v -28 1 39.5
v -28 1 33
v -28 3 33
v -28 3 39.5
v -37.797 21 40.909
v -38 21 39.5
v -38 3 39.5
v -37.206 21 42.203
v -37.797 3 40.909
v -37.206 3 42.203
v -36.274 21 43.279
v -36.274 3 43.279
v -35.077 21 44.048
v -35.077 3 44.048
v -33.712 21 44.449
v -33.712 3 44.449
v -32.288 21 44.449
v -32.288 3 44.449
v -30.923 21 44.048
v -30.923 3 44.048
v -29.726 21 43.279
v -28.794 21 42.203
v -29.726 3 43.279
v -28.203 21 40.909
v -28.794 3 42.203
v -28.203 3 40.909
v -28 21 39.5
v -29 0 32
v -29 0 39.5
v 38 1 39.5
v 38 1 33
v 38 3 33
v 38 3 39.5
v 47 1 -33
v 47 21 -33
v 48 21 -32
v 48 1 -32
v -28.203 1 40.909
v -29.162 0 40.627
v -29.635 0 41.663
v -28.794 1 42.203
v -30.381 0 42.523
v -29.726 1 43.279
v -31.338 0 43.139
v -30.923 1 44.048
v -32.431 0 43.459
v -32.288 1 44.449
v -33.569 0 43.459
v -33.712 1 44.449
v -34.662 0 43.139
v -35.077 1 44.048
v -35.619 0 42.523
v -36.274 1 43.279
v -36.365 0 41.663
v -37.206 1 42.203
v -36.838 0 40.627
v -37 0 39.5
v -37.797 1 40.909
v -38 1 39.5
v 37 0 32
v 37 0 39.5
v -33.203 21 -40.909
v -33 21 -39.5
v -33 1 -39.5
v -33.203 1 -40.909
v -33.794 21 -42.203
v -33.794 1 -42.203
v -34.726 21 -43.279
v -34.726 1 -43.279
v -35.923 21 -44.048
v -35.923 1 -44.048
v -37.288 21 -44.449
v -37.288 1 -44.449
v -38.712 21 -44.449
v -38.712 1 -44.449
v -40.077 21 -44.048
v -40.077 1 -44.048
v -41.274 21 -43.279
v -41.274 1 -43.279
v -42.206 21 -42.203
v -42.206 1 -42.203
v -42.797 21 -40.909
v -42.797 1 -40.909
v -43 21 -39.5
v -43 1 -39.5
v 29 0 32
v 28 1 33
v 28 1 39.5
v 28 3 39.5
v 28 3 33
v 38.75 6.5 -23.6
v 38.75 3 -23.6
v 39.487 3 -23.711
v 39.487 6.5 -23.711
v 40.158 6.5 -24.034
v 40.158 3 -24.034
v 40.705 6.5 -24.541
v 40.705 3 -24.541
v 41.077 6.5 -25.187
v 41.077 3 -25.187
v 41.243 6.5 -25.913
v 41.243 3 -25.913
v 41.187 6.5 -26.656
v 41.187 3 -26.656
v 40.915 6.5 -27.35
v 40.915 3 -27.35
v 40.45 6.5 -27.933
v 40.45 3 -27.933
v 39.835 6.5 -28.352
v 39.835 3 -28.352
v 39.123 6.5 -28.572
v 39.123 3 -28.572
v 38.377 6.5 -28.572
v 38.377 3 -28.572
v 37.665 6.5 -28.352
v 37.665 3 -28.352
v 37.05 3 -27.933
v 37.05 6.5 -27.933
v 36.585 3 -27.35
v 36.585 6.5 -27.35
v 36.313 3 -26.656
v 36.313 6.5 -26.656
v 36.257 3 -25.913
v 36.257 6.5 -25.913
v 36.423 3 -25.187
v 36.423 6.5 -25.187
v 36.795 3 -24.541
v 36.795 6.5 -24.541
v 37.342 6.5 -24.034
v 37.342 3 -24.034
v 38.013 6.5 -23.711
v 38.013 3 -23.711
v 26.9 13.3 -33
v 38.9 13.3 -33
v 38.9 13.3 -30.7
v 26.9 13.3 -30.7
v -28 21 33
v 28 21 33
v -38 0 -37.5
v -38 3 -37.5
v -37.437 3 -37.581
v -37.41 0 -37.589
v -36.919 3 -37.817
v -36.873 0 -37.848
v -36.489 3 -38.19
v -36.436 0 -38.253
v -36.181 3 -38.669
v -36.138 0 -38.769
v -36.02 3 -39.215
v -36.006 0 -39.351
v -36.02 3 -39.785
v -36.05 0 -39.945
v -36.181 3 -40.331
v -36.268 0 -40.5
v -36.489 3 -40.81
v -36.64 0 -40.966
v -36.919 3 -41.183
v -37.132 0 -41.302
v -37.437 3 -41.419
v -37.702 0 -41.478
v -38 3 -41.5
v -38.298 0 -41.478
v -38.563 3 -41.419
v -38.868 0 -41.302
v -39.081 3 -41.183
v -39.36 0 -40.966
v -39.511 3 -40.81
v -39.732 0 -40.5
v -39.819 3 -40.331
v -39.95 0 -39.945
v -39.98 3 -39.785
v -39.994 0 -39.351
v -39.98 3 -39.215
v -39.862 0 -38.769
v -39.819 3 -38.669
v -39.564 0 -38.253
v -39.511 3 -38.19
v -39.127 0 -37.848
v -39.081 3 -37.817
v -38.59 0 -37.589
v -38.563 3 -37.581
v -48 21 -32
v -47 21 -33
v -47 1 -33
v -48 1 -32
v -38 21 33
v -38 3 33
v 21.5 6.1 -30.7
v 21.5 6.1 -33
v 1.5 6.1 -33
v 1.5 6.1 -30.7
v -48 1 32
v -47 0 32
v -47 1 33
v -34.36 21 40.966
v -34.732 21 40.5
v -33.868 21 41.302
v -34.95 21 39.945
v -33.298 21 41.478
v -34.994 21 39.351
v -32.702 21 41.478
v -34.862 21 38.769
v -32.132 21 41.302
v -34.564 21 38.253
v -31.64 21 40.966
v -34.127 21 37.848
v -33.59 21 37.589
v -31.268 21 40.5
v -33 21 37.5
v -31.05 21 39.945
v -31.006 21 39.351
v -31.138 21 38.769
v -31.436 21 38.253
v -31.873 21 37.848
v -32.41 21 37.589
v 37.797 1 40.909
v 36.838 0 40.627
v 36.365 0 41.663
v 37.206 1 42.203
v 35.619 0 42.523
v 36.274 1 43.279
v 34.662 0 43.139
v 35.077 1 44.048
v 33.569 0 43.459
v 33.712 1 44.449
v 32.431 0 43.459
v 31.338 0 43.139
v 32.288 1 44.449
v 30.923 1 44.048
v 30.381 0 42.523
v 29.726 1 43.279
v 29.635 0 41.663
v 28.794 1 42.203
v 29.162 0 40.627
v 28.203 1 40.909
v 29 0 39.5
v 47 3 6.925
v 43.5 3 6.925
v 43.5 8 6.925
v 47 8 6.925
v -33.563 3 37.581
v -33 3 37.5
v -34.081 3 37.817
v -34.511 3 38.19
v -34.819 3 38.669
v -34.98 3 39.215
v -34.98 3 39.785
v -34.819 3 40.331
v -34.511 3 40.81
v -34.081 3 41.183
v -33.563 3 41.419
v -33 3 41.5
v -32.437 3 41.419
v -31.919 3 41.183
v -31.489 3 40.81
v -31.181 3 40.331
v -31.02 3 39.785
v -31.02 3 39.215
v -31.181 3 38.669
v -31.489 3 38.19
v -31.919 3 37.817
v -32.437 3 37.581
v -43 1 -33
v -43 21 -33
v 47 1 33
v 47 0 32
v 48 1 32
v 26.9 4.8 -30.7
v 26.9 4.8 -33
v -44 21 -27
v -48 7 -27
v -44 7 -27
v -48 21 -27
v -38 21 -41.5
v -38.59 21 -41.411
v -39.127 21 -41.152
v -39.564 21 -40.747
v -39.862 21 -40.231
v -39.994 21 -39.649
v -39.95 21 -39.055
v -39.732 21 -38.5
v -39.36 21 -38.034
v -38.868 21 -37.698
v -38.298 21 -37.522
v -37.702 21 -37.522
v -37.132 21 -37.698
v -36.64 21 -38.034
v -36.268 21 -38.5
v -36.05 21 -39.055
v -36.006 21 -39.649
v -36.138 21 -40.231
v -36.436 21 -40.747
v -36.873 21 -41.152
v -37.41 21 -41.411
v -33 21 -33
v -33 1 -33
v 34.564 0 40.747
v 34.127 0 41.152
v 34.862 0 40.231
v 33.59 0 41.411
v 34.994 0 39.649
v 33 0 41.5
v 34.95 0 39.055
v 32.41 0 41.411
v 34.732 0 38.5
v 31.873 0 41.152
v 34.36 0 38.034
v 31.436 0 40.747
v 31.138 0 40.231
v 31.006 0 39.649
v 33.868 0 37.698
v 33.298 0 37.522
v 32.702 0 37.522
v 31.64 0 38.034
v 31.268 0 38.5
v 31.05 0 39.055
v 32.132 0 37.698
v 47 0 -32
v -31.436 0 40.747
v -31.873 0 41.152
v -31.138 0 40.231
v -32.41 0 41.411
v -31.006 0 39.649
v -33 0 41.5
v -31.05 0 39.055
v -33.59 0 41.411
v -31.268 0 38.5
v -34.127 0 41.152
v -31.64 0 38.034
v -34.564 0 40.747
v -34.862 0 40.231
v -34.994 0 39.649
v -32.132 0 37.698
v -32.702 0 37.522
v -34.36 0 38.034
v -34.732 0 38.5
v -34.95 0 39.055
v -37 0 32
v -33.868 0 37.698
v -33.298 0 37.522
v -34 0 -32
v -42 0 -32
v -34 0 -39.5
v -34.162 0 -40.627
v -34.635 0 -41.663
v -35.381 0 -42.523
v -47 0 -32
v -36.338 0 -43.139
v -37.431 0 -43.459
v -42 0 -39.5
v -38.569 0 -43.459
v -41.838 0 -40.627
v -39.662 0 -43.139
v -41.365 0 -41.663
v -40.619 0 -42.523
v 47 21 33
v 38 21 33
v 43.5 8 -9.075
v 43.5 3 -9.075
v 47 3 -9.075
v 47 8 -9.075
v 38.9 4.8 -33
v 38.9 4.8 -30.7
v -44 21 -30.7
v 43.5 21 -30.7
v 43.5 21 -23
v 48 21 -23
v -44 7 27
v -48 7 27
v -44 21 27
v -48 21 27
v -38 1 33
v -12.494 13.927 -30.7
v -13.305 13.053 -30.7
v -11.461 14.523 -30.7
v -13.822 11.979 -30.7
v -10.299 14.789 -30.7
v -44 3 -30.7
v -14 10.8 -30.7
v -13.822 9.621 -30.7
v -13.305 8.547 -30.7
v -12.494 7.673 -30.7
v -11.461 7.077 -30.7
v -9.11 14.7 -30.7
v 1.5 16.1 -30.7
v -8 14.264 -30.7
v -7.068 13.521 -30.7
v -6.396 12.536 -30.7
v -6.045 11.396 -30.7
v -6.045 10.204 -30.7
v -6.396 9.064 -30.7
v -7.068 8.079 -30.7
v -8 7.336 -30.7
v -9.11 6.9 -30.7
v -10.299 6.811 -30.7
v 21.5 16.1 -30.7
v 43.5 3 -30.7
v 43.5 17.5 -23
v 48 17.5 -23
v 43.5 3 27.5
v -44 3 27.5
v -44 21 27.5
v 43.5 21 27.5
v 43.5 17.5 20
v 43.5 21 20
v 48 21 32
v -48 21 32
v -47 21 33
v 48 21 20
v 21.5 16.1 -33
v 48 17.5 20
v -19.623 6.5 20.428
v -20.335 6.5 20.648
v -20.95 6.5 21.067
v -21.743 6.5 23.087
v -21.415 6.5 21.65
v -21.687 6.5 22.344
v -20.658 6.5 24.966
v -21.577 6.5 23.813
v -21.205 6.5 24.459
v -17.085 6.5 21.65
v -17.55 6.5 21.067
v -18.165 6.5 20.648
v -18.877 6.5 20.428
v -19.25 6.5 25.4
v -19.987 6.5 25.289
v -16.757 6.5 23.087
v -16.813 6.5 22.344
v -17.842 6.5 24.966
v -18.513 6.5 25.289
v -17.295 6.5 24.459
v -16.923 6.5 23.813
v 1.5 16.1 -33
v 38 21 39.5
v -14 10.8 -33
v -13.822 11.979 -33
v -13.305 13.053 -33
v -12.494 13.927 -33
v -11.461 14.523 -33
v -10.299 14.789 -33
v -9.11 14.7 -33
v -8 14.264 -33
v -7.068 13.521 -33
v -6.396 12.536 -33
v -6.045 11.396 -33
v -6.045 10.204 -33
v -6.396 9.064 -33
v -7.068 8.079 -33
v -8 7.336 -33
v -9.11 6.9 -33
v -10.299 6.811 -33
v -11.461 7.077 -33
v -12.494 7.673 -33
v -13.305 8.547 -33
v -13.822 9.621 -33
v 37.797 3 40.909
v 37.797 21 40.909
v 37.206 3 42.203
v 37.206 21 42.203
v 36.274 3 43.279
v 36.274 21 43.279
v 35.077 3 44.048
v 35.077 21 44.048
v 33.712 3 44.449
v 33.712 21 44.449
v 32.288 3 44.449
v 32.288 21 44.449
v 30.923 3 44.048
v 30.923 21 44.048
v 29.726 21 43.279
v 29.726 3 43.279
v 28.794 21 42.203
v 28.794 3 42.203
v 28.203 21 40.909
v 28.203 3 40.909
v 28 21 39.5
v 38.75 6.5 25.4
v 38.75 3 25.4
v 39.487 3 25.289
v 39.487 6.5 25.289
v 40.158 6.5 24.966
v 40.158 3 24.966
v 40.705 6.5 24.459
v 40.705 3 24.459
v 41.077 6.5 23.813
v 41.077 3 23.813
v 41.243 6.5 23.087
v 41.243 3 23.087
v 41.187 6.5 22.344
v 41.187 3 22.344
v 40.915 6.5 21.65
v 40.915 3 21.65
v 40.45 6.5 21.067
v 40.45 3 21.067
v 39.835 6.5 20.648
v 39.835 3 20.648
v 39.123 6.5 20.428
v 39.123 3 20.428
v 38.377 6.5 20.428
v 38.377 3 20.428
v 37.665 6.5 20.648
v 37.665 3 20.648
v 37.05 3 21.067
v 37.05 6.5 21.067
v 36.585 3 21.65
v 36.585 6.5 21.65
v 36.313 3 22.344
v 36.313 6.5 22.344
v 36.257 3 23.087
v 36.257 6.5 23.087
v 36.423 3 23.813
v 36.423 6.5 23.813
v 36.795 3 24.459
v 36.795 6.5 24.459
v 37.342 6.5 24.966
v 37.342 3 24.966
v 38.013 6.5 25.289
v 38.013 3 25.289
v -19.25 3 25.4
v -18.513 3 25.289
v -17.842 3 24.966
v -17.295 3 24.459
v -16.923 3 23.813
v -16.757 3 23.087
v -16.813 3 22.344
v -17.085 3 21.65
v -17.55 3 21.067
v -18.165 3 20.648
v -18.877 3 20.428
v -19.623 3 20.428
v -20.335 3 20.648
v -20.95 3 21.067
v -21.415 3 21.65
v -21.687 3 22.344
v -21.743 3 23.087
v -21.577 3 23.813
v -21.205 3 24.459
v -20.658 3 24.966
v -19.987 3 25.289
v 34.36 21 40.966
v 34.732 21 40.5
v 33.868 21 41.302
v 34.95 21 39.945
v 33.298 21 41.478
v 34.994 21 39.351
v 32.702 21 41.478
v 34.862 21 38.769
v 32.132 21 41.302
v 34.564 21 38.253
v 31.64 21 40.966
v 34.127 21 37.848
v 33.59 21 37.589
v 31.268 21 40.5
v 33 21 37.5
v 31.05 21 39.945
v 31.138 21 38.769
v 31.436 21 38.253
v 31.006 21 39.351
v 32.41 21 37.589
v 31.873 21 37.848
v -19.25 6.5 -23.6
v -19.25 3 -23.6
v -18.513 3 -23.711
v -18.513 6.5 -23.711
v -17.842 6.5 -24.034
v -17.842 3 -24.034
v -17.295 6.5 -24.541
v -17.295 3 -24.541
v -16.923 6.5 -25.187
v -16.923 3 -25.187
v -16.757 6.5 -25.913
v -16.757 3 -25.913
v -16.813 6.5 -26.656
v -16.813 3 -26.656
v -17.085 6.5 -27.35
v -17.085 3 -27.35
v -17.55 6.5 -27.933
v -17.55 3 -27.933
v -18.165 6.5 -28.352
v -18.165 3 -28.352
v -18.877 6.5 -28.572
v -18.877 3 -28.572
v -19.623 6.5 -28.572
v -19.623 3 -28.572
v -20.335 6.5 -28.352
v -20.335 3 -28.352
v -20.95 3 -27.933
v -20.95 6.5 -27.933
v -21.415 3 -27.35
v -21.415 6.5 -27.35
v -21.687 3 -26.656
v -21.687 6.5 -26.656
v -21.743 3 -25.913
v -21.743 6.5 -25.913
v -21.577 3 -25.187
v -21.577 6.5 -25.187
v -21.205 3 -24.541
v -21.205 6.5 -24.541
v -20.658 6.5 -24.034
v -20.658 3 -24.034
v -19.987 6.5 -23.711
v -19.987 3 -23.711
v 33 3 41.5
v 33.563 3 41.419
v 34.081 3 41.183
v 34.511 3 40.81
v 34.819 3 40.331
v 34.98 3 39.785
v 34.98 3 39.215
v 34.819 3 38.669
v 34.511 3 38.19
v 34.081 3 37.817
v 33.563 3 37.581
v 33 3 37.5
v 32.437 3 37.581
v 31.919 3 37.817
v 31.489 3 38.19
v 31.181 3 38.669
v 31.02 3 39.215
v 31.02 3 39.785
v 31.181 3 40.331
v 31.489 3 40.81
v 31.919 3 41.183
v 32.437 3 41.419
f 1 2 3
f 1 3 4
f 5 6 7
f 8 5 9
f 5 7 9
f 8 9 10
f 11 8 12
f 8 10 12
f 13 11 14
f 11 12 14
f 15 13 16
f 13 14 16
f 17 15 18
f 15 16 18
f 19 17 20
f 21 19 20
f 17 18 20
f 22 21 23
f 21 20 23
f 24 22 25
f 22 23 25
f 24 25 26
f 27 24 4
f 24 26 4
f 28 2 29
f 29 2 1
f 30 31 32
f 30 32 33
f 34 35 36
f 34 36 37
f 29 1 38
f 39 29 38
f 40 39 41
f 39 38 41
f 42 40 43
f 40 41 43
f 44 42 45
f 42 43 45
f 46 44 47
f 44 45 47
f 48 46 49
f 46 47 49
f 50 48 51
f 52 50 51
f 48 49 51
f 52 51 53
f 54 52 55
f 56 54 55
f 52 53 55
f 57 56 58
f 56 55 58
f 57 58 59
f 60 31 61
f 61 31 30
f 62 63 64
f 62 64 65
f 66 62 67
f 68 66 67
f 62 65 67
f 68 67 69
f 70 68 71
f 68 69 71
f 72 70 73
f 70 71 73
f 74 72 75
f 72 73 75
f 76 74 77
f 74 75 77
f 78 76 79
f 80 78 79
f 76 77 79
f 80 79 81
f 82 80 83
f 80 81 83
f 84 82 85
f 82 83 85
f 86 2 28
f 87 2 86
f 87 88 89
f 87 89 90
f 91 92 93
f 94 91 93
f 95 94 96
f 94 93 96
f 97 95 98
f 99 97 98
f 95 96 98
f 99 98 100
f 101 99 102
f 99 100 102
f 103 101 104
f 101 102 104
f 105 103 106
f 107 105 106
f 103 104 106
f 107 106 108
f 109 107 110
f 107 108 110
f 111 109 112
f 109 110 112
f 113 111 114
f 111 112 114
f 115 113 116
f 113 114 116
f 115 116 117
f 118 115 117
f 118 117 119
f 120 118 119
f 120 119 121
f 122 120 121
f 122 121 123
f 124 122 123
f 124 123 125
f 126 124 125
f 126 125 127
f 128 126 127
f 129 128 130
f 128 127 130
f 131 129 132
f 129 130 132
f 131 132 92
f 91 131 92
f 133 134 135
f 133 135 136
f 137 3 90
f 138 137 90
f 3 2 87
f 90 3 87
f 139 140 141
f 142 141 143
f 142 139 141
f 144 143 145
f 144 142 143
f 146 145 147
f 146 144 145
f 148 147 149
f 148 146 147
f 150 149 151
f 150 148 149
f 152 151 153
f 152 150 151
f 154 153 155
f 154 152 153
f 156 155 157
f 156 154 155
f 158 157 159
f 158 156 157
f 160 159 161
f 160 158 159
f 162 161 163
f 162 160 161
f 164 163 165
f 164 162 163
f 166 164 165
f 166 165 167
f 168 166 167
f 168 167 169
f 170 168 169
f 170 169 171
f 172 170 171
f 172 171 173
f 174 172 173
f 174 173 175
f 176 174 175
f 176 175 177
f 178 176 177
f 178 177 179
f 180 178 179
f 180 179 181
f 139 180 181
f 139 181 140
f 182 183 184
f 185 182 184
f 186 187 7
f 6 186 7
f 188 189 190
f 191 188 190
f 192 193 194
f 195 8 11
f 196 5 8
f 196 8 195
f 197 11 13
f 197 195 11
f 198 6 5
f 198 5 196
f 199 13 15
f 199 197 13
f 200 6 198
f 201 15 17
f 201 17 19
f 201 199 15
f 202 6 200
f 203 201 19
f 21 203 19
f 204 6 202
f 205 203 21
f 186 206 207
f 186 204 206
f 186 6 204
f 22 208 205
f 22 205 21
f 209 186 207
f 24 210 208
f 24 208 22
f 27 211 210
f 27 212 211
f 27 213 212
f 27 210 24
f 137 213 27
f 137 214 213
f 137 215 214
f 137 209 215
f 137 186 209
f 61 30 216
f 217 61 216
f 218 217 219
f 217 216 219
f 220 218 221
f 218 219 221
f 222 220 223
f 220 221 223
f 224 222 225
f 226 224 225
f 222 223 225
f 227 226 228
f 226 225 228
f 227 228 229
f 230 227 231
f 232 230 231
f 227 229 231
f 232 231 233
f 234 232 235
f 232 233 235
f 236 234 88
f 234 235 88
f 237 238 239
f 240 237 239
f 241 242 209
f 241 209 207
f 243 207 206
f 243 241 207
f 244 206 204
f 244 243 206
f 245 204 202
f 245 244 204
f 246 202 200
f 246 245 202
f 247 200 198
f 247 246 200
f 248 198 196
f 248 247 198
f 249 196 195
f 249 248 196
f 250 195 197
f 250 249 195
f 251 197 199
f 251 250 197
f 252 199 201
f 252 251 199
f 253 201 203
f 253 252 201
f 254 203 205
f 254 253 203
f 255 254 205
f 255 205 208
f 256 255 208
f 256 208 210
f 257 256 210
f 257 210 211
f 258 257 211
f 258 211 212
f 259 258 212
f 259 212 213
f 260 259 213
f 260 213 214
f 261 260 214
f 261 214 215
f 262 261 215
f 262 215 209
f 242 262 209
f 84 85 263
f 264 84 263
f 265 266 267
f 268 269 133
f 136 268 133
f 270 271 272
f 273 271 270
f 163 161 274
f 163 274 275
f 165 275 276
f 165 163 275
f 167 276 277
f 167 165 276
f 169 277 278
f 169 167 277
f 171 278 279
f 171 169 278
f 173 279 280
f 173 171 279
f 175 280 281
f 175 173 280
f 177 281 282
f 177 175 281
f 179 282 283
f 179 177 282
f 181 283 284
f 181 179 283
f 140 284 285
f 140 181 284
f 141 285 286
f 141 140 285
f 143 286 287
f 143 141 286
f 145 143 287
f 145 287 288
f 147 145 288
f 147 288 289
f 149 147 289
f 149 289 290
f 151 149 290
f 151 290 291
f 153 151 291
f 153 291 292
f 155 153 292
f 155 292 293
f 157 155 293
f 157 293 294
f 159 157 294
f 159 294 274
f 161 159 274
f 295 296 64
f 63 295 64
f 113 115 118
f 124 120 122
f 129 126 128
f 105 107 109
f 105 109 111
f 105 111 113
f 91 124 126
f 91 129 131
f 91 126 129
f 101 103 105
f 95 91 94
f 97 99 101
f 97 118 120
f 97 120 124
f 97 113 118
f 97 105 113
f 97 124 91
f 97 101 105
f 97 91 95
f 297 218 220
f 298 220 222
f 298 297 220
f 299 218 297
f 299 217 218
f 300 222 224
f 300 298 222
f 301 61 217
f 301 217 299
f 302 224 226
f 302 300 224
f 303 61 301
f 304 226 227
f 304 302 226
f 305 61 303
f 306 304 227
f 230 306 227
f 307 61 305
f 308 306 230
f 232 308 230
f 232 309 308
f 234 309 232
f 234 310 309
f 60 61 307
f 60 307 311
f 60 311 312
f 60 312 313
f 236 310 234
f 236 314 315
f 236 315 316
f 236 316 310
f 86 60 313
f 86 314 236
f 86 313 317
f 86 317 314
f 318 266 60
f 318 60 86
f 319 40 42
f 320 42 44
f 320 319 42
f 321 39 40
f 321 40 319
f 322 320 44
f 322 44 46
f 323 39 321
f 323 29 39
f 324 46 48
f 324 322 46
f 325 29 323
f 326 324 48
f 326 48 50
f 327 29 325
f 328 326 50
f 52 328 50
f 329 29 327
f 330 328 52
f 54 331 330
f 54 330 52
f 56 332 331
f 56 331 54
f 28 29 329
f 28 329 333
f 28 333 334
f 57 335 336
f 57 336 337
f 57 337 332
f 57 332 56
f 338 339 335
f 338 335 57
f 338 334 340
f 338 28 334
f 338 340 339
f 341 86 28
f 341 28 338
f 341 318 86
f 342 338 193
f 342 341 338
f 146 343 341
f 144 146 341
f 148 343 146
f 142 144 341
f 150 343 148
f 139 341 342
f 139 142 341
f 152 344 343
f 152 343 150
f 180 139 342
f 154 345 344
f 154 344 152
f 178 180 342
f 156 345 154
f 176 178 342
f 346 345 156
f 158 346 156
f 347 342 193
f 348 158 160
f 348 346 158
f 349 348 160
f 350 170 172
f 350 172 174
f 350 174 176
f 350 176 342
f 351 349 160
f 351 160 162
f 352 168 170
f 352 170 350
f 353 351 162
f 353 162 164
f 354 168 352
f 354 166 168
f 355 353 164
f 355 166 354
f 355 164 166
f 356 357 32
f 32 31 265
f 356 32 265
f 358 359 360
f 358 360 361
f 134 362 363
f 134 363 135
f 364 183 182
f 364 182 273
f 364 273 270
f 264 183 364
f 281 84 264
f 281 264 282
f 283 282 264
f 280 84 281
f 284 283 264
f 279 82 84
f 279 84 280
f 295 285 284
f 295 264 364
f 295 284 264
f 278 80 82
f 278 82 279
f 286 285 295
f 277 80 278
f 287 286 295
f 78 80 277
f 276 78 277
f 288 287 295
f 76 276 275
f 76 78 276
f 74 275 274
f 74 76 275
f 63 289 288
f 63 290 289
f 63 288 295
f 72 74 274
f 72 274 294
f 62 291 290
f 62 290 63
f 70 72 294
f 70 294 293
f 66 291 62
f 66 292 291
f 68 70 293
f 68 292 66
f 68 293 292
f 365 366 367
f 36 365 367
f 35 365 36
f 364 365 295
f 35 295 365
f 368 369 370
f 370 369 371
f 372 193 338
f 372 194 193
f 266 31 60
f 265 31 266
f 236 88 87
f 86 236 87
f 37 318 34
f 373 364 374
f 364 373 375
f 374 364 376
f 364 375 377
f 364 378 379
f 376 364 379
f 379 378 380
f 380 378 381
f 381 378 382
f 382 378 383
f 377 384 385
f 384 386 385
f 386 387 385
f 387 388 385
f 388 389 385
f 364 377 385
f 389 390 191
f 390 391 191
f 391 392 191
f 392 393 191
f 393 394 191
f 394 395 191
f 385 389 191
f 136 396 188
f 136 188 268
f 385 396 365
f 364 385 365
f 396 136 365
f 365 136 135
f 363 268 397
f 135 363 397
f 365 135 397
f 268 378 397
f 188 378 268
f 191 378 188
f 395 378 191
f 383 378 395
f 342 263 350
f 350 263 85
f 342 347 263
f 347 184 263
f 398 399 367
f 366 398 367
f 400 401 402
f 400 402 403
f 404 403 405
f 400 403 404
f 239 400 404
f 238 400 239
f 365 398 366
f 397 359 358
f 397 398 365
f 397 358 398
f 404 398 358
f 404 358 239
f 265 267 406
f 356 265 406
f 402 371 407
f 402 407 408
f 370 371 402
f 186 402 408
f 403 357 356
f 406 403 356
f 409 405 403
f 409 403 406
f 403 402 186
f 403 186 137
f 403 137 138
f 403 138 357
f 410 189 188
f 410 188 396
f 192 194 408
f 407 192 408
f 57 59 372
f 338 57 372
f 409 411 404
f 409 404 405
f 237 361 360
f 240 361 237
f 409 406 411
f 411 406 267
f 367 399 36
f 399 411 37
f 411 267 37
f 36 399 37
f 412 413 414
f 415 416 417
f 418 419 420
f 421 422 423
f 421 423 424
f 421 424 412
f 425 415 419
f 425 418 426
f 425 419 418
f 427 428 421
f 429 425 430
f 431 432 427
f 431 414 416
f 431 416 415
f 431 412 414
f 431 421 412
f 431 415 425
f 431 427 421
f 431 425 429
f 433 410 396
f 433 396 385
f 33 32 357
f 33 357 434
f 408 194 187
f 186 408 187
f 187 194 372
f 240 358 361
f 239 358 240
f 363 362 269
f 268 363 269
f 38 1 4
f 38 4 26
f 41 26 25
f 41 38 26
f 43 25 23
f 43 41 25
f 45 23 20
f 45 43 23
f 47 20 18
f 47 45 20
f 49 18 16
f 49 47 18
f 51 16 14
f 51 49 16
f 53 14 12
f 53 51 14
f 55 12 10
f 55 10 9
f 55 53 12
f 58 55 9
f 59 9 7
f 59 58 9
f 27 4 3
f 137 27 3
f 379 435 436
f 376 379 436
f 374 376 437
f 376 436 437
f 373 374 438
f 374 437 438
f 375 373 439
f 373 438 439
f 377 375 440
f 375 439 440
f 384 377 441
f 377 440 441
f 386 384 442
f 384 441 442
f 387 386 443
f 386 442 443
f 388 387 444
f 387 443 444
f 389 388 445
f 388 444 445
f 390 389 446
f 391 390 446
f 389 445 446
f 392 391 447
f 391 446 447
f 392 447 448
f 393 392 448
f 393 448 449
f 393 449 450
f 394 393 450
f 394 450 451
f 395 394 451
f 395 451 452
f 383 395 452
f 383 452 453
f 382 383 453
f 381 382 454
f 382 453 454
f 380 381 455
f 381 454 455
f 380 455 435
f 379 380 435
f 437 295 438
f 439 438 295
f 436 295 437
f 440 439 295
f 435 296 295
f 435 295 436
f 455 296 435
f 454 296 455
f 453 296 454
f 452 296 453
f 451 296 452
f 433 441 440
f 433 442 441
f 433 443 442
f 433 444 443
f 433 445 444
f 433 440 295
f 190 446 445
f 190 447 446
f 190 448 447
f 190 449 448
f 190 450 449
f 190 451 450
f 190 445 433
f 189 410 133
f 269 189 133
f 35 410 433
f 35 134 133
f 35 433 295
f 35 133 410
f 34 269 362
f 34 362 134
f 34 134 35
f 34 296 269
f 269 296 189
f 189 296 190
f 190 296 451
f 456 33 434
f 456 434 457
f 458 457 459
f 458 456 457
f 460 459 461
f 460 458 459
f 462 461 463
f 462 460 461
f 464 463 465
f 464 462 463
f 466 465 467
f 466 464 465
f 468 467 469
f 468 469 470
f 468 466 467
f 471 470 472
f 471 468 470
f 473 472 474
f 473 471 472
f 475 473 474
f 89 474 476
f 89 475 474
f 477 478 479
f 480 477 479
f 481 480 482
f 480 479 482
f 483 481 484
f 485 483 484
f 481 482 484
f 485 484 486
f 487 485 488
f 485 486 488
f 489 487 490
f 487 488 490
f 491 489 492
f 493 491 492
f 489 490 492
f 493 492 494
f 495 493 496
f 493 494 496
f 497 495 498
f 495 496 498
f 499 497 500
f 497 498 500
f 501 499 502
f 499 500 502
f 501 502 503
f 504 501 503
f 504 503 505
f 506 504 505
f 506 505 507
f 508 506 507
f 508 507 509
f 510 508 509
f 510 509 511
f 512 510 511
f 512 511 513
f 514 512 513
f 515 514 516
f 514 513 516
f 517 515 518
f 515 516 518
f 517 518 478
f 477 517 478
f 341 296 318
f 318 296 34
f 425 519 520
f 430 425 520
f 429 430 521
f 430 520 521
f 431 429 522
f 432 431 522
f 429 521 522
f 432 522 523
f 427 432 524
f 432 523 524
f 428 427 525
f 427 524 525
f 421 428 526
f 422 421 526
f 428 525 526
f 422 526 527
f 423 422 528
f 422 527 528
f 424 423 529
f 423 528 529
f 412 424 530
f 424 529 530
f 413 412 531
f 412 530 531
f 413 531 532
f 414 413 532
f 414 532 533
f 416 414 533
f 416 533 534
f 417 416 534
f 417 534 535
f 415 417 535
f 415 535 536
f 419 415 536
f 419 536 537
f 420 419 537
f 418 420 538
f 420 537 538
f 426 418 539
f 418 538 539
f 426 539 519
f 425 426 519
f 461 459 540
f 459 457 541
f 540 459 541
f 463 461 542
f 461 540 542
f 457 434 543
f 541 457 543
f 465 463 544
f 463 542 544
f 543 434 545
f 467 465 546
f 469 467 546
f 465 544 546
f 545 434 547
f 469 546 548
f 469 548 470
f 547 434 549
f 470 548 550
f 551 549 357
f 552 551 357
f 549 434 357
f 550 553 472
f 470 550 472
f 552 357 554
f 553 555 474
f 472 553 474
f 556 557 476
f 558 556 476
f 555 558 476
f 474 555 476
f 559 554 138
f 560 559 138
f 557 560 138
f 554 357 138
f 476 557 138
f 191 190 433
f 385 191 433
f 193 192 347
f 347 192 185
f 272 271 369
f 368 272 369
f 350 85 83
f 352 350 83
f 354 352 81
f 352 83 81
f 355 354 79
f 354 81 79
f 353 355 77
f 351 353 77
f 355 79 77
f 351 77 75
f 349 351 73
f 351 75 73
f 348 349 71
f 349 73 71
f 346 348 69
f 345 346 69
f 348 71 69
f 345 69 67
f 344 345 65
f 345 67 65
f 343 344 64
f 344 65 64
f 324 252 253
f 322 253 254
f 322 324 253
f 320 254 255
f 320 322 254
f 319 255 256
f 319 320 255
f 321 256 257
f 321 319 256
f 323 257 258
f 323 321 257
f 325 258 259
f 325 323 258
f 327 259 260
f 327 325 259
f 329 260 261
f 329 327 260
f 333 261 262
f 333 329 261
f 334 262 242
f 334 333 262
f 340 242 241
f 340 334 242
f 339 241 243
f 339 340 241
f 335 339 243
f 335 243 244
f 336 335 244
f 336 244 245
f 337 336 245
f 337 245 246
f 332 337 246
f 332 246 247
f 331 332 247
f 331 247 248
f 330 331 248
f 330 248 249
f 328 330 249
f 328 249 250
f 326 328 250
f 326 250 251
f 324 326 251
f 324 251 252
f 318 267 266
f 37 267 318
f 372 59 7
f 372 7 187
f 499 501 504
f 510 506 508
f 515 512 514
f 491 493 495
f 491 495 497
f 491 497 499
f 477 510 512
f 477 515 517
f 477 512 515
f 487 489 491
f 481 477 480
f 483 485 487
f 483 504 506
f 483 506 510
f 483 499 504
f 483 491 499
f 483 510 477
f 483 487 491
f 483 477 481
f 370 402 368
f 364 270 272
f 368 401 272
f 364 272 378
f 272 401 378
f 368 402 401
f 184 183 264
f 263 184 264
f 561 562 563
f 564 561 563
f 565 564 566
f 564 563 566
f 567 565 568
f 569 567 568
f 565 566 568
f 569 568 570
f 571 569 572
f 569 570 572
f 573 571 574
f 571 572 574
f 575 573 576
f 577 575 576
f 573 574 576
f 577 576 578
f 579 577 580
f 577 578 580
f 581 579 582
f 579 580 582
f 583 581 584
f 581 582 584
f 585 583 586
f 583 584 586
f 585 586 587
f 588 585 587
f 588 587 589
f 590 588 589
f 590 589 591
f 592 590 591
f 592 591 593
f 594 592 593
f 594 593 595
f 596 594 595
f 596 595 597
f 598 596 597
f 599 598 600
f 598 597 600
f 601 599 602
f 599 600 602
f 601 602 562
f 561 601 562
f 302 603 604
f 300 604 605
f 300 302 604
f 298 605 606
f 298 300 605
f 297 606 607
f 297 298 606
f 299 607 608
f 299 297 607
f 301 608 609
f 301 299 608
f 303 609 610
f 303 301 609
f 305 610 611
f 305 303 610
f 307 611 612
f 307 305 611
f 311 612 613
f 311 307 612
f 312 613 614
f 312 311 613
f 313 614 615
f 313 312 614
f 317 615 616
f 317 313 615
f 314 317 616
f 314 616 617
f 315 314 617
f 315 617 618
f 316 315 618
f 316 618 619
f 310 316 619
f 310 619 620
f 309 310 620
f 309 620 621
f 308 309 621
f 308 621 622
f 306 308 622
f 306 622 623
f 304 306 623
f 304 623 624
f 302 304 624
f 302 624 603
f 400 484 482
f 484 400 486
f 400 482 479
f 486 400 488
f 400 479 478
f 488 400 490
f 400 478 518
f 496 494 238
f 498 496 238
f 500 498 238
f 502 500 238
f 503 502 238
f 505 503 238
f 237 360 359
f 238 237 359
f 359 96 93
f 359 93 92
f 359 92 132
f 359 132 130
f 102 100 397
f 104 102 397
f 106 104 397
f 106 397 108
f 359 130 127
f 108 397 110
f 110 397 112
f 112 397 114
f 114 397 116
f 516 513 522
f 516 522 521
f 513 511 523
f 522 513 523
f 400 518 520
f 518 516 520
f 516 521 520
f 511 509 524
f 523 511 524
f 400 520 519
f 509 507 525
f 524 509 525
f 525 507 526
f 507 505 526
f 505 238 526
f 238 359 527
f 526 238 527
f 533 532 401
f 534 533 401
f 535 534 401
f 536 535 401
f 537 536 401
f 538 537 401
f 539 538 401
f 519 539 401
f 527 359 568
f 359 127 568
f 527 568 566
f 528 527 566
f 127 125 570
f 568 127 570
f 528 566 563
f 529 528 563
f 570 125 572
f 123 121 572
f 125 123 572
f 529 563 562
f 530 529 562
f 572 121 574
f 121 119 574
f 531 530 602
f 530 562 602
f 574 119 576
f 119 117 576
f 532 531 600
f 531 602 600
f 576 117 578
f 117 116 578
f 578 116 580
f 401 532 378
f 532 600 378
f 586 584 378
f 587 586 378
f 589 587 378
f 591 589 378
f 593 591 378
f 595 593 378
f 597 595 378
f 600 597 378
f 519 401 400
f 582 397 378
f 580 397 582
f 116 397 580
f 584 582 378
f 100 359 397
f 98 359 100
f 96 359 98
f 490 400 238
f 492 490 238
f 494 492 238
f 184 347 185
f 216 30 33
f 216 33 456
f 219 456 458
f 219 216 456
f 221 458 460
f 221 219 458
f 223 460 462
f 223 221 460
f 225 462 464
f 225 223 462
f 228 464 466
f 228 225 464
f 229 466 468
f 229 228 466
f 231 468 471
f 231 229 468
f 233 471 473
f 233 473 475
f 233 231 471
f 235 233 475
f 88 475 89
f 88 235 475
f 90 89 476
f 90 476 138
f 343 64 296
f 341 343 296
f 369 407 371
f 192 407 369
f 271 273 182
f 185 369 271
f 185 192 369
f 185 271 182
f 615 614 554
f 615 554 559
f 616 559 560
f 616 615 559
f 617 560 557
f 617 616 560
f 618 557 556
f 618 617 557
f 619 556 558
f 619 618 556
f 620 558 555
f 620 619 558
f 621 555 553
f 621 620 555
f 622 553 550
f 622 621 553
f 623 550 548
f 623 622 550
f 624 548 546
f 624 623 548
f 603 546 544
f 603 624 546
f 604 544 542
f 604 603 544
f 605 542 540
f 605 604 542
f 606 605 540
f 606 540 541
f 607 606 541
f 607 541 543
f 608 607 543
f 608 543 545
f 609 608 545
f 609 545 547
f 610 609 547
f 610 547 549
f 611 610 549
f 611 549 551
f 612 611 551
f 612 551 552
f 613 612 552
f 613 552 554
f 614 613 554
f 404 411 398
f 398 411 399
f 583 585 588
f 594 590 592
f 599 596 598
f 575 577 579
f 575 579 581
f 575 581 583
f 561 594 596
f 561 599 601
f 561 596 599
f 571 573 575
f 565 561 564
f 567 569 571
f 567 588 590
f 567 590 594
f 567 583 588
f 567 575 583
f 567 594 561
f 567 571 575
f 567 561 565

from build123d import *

# Parameters (mm, degrees)
SKETCH1_W           = 96
SKETCH1_H           = 66
BOSS_EXTRUDE2_DEPTH = 3
SKETCH4_R           = 2
BOSS_EXTRUDE3_DEPTH = 3
SKETCH8_R           = 2.5
BOSS_EXTRUDE5_DEPTH = 3.5
SKETCH9_W           = 96
SKETCH9_H           = 66
SKETCH9_W_2         = 87.5
SKETCH9_H_2         = 58.2
BOSS_EXTRUDE6_DEPTH = 18
SKETCH11_W          = 54
SKETCH11_H          = 14
CUT_EXTRUDE1_DEPTH  = 4
SKETCH12_W          = 43
SKETCH12_H          = 3.5
CUT_EXTRUDE2_DEPTH  = 4.5
SKETCH13_W          = 16
SKETCH13_H          = 5
CUT_EXTRUDE3_DEPTH  = 3.5
SKETCH14_R          = 4
SKETCH14_W          = 12
SKETCH14_H          = 8.5
SKETCH14_W_2        = 20
SKETCH14_H_2        = 10
CUT_EXTRUDE4_DEPTH  = 2.3
SKETCH16_R          = 2
BOSS_EXTRUDE7_DEPTH = 18
CHAMFER2_SIZE       = 1


with BuildPart() as part:
    # Sketch1 → Boss-Extrude2 (new body)
    with BuildSketch(Plane(origin=(0, 0, 0), x_dir=(1, 0, 0), z_dir=(0, 1, 0))):
        Rectangle(SKETCH1_W, SKETCH1_H)
    extrude(amount=BOSS_EXTRUDE2_DEPTH)

    # Sketch4 → Boss-Extrude3 (add)
    # profile 1 of 3: a face of its own
    with BuildSketch(Plane(origin=(0, 0, 0), x_dir=(1, 0, 0), z_dir=(0, 1, 0))):
        with BuildLine():
            Line((-43, 33), (-43, 39.5))
            ThreePointArc((-43, 39.5), (-38, 44.5), (-33, 39.5))
            Line((-33, 39.5), (-33, 33))
            ThreePointArc((-33, 33), (-38, 28), (-43, 33))
        make_face()
        with Locations(Location((-38, 39.5, 0), (0, 0, 270))):
            Circle(SKETCH4_R, mode=Mode.SUBTRACT)
    # profile 2 of 3: a face of its own
    with BuildSketch(Plane(origin=(0, 0, 0), x_dir=(1, 0, 0), z_dir=(0, 1, 0))):
        with BuildLine():
            Line((-28, -33), (-28, -39.5))
            ThreePointArc((-28, -39.5), (-33, -44.5), (-38, -39.5))
            Line((-38, -39.5), (-38, -33))
            ThreePointArc((-38, -33), (-33, -28), (-28, -33))
        make_face()
        with Locations(Location((-33, -39.5, 0), (0, 0, 270))):
            Circle(SKETCH4_R, mode=Mode.SUBTRACT)
    # profile 3 of 3: a face of its own
    with BuildSketch(Plane(origin=(0, 0, 0), x_dir=(1, 0, 0), z_dir=(0, 1, 0))):
        with BuildLine():
            Line((38, -33), (38, -39.5))
            ThreePointArc((38, -39.5), (33, -44.5), (28, -39.5))
            Line((28, -39.5), (28, -33))
            ThreePointArc((28, -33), (33, -28), (38, -33))
        make_face()
        with Locations(Location((33, -39.5, 0), (0, 0, 270))):
            Circle(SKETCH4_R, mode=Mode.SUBTRACT)
    extrude(amount=BOSS_EXTRUDE3_DEPTH)

    # Sketch8 → Boss-Extrude5 (add)
    with BuildSketch(Plane(origin=(0, 3, 0), x_dir=(1, 0, 0), z_dir=(0, 1, 0))):
        with Locations(Location((-19.25, 26.1, 0), (0, 0, 270))):
            Circle(SKETCH8_R)
        with Locations(Location((38.75, 26.1, 0), (0, 0, 270))):
            Circle(SKETCH8_R)
        with Locations(Location((38.75, -22.9, 0), (0, 0, 270))):
            Circle(SKETCH8_R)
        with Locations(Location((-19.25, -22.9, 0), (0, 0, 270))):
            Circle(SKETCH8_R)
    extrude(amount=BOSS_EXTRUDE5_DEPTH)

    # Sketch9 → Boss-Extrude6 (add)
    with BuildSketch(Plane(origin=(0, 3, 0), x_dir=(1, 0, 0), z_dir=(0, 1, 0))):
        Rectangle(SKETCH9_W, SKETCH9_H)
        with Locations((-0.25, 1.6)):
            Rectangle(SKETCH9_W_2, SKETCH9_H_2, mode=Mode.SUBTRACT)
    extrude(amount=BOSS_EXTRUDE6_DEPTH)

    # Sketch11 → Cut-Extrude1 (cut)
    with BuildSketch(Plane.ZY.offset(48)):
        with Locations((0, 14)):
            Rectangle(SKETCH11_W, SKETCH11_H)
    extrude(amount=-CUT_EXTRUDE1_DEPTH, mode=Mode.SUBTRACT)

    # Sketch12 → Cut-Extrude2 (cut)
    with BuildSketch(Plane(origin=(48, 0, 0), x_dir=(0, 0, -1), z_dir=(1, 0, 0))):
        with Locations((1.5, 19.25)):
            Rectangle(SKETCH12_W, SKETCH12_H)
    extrude(amount=-CUT_EXTRUDE2_DEPTH, mode=Mode.SUBTRACT)

    # Sketch13 → Cut-Extrude3 (cut)
    with BuildSketch(Plane.ZY.offset(-43.5)):
        with Locations((-1.07504867, 5.5)):
            Rectangle(SKETCH13_W, SKETCH13_H)
    extrude(amount=-CUT_EXTRUDE3_DEPTH, mode=Mode.SUBTRACT)

    # Sketch14 → Cut-Extrude4 (cut)
    with BuildSketch(Plane(origin=(0, 0, -33), x_dir=(-1, 0, 0), z_dir=(0, 0, -1))):
        with Locations((10, 10.8)):
            Circle(SKETCH14_R)
        with Locations((-32.9, 9.05)):
            Rectangle(SKETCH14_W, SKETCH14_H)
        with Locations((-11.5, 11.1)):
            Rectangle(SKETCH14_W_2, SKETCH14_H_2)
    extrude(amount=-CUT_EXTRUDE4_DEPTH, mode=Mode.SUBTRACT)

    # Sketch16 → Boss-Extrude7 (add)
    # profile 1 of 3: a face of its own
    with BuildSketch(Plane(origin=(0, 3, 0), x_dir=(1, 0, 0), z_dir=(0, 1, 0))):
        with BuildLine():
            Line((-43, 33), (-33, 33))
            Line((-33, 33), (-33, 39.5))
            ThreePointArc((-33, 39.5), (-38, 44.5), (-43, 39.5))
            Line((-43, 39.5), (-43, 33))
        make_face()
        with Locations(Location((-38, 39.5, 0), (0, 0, 90))):
            Circle(SKETCH16_R, mode=Mode.SUBTRACT)
    # profile 2 of 3: a face of its own
    with BuildSketch(Plane(origin=(0, 3, 0), x_dir=(1, 0, 0), z_dir=(0, 1, 0))):
        with BuildLine():
            Line((-38, -33), (-38, -39.5))
            ThreePointArc((-38, -39.5), (-33, -44.5), (-28, -39.5))
            Line((-28, -39.5), (-28, -33))
            Line((-28, -33), (-38, -33))
        make_face()
        with Locations(Location((-33, -39.5, 0), (0, 0, 90))):
            Circle(SKETCH16_R, mode=Mode.SUBTRACT)
    # profile 3 of 3: a face of its own
    with BuildSketch(Plane(origin=(0, 3, 0), x_dir=(1, 0, 0), z_dir=(0, 1, 0))):
        with BuildLine():
            Line((28, -39.5), (28, -33))
            Line((28, -33), (38, -33))
            Line((38, -33), (38, -39.5))
            ThreePointArc((38, -39.5), (33, -44.5), (28, -39.5))
        make_face()
        with Locations(Location((33, -39.5, 0), (0, 0, 90))):
            Circle(SKETCH16_R, mode=Mode.SUBTRACT)
    extrude(amount=BOSS_EXTRUDE7_DEPTH)

    # Chamfer2
    chamfer2_edges = [part.edges().sort_by_distance(p)[0] for p in [
        (-45.5, 0, -33),
        (-33, 0, -36.25),
        (-38, 0, -44.5),
        (-43, 0, -36.25),
        (-43, 0, 33),
        (-38, 0, 36.25),
        (-33, 0, 44.5),
        (-28, 0, 36.25),
        (0, 0, 33),
        (48, 0, 0),
        (28, 0, 36.25),
        (33, 0, 44.5),
        (38, 0, 36.25),
        (43, 0, 33),
        (-48, 0, 0),
        (7.5, 0, -33),
        (48, 10.5, -33),
        (48, 10.5, 33),
        (-48, 10.5, 33),
        (-48, 10.5, -33),
    ]]
    chamfer(chamfer2_edges, length=CHAMFER2_SIZE)


solid = part.part
